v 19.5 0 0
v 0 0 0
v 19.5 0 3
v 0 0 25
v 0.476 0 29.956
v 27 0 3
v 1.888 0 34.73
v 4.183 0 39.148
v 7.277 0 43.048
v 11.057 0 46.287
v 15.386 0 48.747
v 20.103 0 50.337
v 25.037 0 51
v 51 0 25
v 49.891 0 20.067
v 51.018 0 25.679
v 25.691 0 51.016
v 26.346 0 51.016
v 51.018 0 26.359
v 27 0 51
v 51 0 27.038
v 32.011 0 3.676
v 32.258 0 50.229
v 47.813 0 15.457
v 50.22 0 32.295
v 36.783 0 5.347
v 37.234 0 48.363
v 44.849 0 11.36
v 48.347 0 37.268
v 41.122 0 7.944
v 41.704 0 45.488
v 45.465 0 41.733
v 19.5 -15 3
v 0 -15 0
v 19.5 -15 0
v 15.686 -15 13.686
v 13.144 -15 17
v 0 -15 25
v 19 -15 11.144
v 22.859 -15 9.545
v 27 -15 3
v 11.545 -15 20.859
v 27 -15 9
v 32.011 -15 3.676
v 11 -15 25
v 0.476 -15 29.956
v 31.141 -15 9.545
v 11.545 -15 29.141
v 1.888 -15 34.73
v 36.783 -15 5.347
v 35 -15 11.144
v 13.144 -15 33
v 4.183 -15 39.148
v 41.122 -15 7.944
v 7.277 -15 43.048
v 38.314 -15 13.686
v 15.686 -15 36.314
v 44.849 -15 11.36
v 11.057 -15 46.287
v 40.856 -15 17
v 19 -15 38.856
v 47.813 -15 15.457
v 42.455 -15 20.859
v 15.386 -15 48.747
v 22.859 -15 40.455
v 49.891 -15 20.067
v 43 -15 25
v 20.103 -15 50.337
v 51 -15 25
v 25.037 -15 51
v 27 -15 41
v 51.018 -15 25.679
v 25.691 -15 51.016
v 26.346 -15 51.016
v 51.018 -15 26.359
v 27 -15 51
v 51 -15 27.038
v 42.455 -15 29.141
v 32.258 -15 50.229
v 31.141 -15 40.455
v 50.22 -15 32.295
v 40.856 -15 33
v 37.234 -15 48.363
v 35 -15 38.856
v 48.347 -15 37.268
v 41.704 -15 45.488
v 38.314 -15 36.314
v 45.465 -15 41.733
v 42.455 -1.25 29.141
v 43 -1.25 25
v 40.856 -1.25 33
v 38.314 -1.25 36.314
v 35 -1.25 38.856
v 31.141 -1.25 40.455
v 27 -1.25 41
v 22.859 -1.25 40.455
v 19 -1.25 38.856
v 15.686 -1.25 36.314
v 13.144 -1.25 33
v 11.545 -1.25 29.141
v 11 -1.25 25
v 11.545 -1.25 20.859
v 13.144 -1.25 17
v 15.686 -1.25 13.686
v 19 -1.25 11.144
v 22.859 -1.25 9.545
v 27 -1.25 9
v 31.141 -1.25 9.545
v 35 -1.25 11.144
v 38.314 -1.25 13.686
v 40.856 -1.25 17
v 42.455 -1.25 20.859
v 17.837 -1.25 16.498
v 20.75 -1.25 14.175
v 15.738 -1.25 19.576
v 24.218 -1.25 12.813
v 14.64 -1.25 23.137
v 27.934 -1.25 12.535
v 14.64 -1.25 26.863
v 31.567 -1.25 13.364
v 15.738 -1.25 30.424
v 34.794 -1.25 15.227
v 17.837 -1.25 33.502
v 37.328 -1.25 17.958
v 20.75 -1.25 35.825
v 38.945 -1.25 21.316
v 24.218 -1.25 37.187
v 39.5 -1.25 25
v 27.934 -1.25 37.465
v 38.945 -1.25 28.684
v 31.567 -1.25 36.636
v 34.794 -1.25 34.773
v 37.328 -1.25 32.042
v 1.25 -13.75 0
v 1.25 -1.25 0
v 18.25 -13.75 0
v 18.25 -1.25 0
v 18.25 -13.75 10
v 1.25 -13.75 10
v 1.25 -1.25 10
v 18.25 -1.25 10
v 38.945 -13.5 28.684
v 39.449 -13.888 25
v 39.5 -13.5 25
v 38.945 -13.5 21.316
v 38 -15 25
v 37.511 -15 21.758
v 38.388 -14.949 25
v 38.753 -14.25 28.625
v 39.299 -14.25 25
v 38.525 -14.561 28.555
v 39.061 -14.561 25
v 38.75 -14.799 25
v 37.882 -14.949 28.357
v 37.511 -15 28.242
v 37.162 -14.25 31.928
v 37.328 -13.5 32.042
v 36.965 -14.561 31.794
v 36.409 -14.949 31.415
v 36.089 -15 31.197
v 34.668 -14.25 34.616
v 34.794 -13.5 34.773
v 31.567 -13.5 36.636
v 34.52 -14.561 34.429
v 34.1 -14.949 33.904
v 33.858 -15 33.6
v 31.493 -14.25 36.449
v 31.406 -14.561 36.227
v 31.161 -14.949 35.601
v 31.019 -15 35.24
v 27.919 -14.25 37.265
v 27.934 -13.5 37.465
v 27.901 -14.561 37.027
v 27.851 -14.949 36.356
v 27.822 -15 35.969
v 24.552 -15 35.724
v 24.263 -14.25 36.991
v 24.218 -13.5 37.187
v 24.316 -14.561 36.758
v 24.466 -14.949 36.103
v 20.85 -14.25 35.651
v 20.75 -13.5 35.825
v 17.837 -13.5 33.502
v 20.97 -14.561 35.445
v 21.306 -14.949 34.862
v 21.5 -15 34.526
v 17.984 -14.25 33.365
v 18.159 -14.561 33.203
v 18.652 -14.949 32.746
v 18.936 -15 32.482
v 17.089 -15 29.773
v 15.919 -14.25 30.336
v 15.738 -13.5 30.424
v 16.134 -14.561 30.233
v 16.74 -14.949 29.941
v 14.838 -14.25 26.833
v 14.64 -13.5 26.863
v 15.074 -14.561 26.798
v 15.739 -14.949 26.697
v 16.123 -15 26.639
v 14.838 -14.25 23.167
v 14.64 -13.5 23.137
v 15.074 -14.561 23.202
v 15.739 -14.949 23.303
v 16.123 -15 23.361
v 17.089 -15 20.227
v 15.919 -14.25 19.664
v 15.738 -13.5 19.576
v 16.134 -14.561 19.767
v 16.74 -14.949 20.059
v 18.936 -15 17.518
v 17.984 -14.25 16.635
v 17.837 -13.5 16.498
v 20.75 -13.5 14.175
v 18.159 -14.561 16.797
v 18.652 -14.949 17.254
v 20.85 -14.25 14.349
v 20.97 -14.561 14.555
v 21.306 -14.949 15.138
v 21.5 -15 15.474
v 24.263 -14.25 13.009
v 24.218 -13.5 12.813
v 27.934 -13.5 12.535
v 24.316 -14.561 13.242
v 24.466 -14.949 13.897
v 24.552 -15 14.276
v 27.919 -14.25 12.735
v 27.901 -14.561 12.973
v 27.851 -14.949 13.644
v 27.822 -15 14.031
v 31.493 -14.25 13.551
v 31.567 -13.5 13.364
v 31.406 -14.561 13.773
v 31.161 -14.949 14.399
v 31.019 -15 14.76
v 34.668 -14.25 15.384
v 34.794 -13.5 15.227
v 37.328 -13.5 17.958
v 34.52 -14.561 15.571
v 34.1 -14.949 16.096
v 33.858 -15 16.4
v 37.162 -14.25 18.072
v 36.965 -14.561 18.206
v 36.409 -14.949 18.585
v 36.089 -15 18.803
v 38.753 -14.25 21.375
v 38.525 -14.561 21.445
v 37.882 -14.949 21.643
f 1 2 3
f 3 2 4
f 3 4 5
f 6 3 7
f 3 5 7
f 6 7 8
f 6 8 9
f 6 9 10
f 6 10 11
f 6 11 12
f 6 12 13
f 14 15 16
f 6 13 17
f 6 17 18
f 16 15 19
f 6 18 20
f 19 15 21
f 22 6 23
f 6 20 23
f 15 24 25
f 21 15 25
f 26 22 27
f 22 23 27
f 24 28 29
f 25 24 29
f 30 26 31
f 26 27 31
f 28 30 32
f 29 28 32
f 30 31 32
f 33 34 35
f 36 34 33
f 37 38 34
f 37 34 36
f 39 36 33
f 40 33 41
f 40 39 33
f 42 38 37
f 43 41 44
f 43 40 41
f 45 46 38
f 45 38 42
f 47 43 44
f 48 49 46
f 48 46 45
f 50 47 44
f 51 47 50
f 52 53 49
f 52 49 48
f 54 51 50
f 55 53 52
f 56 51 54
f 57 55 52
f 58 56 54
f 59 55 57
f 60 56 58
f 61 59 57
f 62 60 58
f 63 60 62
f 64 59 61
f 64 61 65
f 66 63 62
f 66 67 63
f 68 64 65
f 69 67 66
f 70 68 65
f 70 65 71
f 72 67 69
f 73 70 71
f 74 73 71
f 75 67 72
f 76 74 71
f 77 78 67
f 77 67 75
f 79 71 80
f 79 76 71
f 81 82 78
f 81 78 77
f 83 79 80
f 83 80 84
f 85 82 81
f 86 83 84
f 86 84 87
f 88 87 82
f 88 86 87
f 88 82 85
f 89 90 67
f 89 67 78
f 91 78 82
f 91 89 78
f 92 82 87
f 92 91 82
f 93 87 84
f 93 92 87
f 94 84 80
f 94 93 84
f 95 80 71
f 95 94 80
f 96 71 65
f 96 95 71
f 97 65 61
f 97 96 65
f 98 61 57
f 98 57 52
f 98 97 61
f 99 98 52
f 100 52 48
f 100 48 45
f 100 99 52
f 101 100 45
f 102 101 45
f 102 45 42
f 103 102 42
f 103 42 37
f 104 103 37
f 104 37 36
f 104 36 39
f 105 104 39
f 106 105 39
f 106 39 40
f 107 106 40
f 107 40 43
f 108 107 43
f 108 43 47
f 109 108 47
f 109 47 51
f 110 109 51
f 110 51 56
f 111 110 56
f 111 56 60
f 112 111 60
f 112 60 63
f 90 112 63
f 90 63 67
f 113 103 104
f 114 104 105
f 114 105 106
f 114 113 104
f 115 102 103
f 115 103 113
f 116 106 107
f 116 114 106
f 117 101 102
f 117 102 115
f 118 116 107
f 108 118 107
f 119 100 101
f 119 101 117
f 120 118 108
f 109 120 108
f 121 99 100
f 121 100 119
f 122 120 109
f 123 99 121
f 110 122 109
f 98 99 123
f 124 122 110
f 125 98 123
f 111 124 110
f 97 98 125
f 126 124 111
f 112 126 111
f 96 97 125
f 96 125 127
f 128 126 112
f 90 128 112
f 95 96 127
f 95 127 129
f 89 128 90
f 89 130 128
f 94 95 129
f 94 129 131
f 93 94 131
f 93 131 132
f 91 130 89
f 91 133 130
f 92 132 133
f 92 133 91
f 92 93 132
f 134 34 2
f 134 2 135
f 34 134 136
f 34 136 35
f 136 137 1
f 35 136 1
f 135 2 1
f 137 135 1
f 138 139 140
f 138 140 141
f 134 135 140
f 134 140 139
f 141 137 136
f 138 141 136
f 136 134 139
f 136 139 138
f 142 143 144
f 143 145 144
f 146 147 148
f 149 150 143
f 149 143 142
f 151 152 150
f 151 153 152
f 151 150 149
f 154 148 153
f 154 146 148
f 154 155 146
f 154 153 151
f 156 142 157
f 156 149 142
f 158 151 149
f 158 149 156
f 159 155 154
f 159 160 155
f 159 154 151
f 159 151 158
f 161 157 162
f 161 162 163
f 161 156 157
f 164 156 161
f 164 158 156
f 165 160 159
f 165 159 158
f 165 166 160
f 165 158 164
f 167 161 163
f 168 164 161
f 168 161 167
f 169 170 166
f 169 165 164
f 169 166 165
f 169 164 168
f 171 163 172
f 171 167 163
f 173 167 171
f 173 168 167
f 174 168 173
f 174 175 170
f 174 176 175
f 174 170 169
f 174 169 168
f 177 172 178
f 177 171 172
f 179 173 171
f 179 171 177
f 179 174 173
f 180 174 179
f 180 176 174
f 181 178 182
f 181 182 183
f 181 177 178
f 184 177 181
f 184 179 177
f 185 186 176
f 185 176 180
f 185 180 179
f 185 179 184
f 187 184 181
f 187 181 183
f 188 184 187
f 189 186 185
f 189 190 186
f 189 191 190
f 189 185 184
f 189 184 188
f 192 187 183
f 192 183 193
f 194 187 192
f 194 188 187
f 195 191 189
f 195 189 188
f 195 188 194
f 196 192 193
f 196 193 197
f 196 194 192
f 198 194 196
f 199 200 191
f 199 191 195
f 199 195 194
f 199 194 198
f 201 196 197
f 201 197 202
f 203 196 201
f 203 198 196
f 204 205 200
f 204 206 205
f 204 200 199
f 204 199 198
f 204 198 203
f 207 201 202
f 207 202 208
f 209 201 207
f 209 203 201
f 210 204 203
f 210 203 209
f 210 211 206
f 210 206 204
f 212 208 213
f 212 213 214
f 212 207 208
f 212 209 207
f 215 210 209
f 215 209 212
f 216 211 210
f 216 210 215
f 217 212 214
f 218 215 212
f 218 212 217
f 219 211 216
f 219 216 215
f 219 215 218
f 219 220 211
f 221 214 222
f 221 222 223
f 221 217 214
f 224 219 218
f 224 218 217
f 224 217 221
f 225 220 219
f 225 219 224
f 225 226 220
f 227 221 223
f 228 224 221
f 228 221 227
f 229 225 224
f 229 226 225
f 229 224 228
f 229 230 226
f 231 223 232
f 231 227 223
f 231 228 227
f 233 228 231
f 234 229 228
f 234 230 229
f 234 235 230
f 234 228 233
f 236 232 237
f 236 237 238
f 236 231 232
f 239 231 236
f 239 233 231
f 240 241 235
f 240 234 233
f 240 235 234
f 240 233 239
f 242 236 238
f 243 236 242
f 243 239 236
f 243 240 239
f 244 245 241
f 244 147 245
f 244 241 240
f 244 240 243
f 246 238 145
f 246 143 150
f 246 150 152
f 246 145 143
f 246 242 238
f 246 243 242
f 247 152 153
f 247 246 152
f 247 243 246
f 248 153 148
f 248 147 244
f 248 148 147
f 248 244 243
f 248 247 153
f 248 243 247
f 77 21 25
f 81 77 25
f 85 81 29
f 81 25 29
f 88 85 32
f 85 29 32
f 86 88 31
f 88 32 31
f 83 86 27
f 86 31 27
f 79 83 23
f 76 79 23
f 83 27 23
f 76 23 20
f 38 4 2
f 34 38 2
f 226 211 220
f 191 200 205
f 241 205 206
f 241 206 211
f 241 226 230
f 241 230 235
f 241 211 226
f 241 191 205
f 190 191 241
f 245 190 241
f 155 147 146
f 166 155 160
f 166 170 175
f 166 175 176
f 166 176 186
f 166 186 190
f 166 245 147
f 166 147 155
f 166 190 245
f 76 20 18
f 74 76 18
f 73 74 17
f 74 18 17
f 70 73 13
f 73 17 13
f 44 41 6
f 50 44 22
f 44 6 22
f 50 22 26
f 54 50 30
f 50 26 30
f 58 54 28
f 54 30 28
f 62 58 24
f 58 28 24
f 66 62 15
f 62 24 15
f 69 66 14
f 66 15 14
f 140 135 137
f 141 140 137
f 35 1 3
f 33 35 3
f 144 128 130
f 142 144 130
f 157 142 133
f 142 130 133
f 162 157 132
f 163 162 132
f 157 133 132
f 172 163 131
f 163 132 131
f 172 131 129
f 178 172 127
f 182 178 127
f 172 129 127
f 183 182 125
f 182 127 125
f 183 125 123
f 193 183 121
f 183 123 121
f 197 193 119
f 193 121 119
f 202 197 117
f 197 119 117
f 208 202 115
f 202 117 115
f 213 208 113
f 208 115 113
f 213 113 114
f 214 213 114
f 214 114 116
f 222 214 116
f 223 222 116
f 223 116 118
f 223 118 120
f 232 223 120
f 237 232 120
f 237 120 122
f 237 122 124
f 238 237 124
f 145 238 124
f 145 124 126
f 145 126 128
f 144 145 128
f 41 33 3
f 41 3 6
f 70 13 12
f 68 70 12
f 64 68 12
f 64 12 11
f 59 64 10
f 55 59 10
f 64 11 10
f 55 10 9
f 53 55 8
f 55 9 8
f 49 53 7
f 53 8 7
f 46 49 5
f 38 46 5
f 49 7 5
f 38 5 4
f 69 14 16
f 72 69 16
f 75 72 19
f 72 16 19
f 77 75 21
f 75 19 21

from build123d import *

# Parameters (mm, degrees)
F0_R     = 16
F1_DEPTH = 15
F0_R_2   = 12.5
F2_DEPTH = 1.25
F3_W     = 17
F3_H     = 12.5
F4_DEPTH = 10
F5_R     = 1.5


with BuildPart() as f1:
    # F0 (on Front) → F1 (new body)
    with BuildSketch(Plane.XZ):
        with BuildLine():
            Line((0, 25), (0, 0))
            Line((0, 0), (19.5, 0))
            Line((19.5, 0), (19.5, 3))
            Line((19.5, 3), (27, 3))
            ThreePointArc((27, 3), (43.0721423298, 9.5576629129), (51, 25))
            Line((51, 25), (51, 27.0383693291))
            ThreePointArc((51, 27.0383693291), (43.6843051192, 43.7109906775), (27, 51))
            Line((27, 51), (25.037037037, 51))
            ThreePointArc((25.037037037, 51), (7.2768537045, 43.0475290801), (0, 25))
        make_face()
        with Locations((27, 25)):
            Circle(F0_R, mode=Mode.SUBTRACT)
        with BuildLine():
            ThreePointArc((27, 51), (26.0185185185, 51.0185185185), (25.037037037, 51))
            Line((25.037037037, 51), (27, 51))
        make_face()
        with BuildLine():
            Line((51, 27.0383693291), (51, 25))
            ThreePointArc((51, 25), (51.0207833866, 26.0191846645), (51, 27.0383693291))
        make_face()
    extrude(amount=F1_DEPTH)



with BuildPart() as f1b:
    # F0 (on Front) → F1, piece 2 (new body)
    with BuildSketch(Plane.XZ):
        with Locations((27, 25)):
            Circle(F0_R_2)
    extrude(amount=F1_DEPTH)


with BuildPart() as f1_1:
    add(f1.part)

    add(f1b.part)  # F2 merges F1b
    # F0 (on Front) → F2 (join)
    with BuildSketch(Plane.XZ):
        with Locations((27, 25)):
            Circle(F0_R)
        with Locations((27, 25)):
            Circle(F0_R_2, mode=Mode.SUBTRACT)
    extrude(amount=F2_DEPTH)

    # F3 (on face) → F4 (cut)
    with BuildSketch(Plane(origin=(0, 0, 0), x_dir=(1, 0, 0), z_dir=(0, 0, -1))):
        with Locations((9.75, 7.5)):
            Rectangle(F3_W, F3_H)
    extrude(amount=-F4_DEPTH, mode=Mode.SUBTRACT)

    # F5
    f5_edges = [f1_1.edges().sort_by_distance(p)[0] for p in [
        (14.5, -15, 25),
    ]]
    fillet(f5_edges, radius=F5_R)


solid = f1_1.part
